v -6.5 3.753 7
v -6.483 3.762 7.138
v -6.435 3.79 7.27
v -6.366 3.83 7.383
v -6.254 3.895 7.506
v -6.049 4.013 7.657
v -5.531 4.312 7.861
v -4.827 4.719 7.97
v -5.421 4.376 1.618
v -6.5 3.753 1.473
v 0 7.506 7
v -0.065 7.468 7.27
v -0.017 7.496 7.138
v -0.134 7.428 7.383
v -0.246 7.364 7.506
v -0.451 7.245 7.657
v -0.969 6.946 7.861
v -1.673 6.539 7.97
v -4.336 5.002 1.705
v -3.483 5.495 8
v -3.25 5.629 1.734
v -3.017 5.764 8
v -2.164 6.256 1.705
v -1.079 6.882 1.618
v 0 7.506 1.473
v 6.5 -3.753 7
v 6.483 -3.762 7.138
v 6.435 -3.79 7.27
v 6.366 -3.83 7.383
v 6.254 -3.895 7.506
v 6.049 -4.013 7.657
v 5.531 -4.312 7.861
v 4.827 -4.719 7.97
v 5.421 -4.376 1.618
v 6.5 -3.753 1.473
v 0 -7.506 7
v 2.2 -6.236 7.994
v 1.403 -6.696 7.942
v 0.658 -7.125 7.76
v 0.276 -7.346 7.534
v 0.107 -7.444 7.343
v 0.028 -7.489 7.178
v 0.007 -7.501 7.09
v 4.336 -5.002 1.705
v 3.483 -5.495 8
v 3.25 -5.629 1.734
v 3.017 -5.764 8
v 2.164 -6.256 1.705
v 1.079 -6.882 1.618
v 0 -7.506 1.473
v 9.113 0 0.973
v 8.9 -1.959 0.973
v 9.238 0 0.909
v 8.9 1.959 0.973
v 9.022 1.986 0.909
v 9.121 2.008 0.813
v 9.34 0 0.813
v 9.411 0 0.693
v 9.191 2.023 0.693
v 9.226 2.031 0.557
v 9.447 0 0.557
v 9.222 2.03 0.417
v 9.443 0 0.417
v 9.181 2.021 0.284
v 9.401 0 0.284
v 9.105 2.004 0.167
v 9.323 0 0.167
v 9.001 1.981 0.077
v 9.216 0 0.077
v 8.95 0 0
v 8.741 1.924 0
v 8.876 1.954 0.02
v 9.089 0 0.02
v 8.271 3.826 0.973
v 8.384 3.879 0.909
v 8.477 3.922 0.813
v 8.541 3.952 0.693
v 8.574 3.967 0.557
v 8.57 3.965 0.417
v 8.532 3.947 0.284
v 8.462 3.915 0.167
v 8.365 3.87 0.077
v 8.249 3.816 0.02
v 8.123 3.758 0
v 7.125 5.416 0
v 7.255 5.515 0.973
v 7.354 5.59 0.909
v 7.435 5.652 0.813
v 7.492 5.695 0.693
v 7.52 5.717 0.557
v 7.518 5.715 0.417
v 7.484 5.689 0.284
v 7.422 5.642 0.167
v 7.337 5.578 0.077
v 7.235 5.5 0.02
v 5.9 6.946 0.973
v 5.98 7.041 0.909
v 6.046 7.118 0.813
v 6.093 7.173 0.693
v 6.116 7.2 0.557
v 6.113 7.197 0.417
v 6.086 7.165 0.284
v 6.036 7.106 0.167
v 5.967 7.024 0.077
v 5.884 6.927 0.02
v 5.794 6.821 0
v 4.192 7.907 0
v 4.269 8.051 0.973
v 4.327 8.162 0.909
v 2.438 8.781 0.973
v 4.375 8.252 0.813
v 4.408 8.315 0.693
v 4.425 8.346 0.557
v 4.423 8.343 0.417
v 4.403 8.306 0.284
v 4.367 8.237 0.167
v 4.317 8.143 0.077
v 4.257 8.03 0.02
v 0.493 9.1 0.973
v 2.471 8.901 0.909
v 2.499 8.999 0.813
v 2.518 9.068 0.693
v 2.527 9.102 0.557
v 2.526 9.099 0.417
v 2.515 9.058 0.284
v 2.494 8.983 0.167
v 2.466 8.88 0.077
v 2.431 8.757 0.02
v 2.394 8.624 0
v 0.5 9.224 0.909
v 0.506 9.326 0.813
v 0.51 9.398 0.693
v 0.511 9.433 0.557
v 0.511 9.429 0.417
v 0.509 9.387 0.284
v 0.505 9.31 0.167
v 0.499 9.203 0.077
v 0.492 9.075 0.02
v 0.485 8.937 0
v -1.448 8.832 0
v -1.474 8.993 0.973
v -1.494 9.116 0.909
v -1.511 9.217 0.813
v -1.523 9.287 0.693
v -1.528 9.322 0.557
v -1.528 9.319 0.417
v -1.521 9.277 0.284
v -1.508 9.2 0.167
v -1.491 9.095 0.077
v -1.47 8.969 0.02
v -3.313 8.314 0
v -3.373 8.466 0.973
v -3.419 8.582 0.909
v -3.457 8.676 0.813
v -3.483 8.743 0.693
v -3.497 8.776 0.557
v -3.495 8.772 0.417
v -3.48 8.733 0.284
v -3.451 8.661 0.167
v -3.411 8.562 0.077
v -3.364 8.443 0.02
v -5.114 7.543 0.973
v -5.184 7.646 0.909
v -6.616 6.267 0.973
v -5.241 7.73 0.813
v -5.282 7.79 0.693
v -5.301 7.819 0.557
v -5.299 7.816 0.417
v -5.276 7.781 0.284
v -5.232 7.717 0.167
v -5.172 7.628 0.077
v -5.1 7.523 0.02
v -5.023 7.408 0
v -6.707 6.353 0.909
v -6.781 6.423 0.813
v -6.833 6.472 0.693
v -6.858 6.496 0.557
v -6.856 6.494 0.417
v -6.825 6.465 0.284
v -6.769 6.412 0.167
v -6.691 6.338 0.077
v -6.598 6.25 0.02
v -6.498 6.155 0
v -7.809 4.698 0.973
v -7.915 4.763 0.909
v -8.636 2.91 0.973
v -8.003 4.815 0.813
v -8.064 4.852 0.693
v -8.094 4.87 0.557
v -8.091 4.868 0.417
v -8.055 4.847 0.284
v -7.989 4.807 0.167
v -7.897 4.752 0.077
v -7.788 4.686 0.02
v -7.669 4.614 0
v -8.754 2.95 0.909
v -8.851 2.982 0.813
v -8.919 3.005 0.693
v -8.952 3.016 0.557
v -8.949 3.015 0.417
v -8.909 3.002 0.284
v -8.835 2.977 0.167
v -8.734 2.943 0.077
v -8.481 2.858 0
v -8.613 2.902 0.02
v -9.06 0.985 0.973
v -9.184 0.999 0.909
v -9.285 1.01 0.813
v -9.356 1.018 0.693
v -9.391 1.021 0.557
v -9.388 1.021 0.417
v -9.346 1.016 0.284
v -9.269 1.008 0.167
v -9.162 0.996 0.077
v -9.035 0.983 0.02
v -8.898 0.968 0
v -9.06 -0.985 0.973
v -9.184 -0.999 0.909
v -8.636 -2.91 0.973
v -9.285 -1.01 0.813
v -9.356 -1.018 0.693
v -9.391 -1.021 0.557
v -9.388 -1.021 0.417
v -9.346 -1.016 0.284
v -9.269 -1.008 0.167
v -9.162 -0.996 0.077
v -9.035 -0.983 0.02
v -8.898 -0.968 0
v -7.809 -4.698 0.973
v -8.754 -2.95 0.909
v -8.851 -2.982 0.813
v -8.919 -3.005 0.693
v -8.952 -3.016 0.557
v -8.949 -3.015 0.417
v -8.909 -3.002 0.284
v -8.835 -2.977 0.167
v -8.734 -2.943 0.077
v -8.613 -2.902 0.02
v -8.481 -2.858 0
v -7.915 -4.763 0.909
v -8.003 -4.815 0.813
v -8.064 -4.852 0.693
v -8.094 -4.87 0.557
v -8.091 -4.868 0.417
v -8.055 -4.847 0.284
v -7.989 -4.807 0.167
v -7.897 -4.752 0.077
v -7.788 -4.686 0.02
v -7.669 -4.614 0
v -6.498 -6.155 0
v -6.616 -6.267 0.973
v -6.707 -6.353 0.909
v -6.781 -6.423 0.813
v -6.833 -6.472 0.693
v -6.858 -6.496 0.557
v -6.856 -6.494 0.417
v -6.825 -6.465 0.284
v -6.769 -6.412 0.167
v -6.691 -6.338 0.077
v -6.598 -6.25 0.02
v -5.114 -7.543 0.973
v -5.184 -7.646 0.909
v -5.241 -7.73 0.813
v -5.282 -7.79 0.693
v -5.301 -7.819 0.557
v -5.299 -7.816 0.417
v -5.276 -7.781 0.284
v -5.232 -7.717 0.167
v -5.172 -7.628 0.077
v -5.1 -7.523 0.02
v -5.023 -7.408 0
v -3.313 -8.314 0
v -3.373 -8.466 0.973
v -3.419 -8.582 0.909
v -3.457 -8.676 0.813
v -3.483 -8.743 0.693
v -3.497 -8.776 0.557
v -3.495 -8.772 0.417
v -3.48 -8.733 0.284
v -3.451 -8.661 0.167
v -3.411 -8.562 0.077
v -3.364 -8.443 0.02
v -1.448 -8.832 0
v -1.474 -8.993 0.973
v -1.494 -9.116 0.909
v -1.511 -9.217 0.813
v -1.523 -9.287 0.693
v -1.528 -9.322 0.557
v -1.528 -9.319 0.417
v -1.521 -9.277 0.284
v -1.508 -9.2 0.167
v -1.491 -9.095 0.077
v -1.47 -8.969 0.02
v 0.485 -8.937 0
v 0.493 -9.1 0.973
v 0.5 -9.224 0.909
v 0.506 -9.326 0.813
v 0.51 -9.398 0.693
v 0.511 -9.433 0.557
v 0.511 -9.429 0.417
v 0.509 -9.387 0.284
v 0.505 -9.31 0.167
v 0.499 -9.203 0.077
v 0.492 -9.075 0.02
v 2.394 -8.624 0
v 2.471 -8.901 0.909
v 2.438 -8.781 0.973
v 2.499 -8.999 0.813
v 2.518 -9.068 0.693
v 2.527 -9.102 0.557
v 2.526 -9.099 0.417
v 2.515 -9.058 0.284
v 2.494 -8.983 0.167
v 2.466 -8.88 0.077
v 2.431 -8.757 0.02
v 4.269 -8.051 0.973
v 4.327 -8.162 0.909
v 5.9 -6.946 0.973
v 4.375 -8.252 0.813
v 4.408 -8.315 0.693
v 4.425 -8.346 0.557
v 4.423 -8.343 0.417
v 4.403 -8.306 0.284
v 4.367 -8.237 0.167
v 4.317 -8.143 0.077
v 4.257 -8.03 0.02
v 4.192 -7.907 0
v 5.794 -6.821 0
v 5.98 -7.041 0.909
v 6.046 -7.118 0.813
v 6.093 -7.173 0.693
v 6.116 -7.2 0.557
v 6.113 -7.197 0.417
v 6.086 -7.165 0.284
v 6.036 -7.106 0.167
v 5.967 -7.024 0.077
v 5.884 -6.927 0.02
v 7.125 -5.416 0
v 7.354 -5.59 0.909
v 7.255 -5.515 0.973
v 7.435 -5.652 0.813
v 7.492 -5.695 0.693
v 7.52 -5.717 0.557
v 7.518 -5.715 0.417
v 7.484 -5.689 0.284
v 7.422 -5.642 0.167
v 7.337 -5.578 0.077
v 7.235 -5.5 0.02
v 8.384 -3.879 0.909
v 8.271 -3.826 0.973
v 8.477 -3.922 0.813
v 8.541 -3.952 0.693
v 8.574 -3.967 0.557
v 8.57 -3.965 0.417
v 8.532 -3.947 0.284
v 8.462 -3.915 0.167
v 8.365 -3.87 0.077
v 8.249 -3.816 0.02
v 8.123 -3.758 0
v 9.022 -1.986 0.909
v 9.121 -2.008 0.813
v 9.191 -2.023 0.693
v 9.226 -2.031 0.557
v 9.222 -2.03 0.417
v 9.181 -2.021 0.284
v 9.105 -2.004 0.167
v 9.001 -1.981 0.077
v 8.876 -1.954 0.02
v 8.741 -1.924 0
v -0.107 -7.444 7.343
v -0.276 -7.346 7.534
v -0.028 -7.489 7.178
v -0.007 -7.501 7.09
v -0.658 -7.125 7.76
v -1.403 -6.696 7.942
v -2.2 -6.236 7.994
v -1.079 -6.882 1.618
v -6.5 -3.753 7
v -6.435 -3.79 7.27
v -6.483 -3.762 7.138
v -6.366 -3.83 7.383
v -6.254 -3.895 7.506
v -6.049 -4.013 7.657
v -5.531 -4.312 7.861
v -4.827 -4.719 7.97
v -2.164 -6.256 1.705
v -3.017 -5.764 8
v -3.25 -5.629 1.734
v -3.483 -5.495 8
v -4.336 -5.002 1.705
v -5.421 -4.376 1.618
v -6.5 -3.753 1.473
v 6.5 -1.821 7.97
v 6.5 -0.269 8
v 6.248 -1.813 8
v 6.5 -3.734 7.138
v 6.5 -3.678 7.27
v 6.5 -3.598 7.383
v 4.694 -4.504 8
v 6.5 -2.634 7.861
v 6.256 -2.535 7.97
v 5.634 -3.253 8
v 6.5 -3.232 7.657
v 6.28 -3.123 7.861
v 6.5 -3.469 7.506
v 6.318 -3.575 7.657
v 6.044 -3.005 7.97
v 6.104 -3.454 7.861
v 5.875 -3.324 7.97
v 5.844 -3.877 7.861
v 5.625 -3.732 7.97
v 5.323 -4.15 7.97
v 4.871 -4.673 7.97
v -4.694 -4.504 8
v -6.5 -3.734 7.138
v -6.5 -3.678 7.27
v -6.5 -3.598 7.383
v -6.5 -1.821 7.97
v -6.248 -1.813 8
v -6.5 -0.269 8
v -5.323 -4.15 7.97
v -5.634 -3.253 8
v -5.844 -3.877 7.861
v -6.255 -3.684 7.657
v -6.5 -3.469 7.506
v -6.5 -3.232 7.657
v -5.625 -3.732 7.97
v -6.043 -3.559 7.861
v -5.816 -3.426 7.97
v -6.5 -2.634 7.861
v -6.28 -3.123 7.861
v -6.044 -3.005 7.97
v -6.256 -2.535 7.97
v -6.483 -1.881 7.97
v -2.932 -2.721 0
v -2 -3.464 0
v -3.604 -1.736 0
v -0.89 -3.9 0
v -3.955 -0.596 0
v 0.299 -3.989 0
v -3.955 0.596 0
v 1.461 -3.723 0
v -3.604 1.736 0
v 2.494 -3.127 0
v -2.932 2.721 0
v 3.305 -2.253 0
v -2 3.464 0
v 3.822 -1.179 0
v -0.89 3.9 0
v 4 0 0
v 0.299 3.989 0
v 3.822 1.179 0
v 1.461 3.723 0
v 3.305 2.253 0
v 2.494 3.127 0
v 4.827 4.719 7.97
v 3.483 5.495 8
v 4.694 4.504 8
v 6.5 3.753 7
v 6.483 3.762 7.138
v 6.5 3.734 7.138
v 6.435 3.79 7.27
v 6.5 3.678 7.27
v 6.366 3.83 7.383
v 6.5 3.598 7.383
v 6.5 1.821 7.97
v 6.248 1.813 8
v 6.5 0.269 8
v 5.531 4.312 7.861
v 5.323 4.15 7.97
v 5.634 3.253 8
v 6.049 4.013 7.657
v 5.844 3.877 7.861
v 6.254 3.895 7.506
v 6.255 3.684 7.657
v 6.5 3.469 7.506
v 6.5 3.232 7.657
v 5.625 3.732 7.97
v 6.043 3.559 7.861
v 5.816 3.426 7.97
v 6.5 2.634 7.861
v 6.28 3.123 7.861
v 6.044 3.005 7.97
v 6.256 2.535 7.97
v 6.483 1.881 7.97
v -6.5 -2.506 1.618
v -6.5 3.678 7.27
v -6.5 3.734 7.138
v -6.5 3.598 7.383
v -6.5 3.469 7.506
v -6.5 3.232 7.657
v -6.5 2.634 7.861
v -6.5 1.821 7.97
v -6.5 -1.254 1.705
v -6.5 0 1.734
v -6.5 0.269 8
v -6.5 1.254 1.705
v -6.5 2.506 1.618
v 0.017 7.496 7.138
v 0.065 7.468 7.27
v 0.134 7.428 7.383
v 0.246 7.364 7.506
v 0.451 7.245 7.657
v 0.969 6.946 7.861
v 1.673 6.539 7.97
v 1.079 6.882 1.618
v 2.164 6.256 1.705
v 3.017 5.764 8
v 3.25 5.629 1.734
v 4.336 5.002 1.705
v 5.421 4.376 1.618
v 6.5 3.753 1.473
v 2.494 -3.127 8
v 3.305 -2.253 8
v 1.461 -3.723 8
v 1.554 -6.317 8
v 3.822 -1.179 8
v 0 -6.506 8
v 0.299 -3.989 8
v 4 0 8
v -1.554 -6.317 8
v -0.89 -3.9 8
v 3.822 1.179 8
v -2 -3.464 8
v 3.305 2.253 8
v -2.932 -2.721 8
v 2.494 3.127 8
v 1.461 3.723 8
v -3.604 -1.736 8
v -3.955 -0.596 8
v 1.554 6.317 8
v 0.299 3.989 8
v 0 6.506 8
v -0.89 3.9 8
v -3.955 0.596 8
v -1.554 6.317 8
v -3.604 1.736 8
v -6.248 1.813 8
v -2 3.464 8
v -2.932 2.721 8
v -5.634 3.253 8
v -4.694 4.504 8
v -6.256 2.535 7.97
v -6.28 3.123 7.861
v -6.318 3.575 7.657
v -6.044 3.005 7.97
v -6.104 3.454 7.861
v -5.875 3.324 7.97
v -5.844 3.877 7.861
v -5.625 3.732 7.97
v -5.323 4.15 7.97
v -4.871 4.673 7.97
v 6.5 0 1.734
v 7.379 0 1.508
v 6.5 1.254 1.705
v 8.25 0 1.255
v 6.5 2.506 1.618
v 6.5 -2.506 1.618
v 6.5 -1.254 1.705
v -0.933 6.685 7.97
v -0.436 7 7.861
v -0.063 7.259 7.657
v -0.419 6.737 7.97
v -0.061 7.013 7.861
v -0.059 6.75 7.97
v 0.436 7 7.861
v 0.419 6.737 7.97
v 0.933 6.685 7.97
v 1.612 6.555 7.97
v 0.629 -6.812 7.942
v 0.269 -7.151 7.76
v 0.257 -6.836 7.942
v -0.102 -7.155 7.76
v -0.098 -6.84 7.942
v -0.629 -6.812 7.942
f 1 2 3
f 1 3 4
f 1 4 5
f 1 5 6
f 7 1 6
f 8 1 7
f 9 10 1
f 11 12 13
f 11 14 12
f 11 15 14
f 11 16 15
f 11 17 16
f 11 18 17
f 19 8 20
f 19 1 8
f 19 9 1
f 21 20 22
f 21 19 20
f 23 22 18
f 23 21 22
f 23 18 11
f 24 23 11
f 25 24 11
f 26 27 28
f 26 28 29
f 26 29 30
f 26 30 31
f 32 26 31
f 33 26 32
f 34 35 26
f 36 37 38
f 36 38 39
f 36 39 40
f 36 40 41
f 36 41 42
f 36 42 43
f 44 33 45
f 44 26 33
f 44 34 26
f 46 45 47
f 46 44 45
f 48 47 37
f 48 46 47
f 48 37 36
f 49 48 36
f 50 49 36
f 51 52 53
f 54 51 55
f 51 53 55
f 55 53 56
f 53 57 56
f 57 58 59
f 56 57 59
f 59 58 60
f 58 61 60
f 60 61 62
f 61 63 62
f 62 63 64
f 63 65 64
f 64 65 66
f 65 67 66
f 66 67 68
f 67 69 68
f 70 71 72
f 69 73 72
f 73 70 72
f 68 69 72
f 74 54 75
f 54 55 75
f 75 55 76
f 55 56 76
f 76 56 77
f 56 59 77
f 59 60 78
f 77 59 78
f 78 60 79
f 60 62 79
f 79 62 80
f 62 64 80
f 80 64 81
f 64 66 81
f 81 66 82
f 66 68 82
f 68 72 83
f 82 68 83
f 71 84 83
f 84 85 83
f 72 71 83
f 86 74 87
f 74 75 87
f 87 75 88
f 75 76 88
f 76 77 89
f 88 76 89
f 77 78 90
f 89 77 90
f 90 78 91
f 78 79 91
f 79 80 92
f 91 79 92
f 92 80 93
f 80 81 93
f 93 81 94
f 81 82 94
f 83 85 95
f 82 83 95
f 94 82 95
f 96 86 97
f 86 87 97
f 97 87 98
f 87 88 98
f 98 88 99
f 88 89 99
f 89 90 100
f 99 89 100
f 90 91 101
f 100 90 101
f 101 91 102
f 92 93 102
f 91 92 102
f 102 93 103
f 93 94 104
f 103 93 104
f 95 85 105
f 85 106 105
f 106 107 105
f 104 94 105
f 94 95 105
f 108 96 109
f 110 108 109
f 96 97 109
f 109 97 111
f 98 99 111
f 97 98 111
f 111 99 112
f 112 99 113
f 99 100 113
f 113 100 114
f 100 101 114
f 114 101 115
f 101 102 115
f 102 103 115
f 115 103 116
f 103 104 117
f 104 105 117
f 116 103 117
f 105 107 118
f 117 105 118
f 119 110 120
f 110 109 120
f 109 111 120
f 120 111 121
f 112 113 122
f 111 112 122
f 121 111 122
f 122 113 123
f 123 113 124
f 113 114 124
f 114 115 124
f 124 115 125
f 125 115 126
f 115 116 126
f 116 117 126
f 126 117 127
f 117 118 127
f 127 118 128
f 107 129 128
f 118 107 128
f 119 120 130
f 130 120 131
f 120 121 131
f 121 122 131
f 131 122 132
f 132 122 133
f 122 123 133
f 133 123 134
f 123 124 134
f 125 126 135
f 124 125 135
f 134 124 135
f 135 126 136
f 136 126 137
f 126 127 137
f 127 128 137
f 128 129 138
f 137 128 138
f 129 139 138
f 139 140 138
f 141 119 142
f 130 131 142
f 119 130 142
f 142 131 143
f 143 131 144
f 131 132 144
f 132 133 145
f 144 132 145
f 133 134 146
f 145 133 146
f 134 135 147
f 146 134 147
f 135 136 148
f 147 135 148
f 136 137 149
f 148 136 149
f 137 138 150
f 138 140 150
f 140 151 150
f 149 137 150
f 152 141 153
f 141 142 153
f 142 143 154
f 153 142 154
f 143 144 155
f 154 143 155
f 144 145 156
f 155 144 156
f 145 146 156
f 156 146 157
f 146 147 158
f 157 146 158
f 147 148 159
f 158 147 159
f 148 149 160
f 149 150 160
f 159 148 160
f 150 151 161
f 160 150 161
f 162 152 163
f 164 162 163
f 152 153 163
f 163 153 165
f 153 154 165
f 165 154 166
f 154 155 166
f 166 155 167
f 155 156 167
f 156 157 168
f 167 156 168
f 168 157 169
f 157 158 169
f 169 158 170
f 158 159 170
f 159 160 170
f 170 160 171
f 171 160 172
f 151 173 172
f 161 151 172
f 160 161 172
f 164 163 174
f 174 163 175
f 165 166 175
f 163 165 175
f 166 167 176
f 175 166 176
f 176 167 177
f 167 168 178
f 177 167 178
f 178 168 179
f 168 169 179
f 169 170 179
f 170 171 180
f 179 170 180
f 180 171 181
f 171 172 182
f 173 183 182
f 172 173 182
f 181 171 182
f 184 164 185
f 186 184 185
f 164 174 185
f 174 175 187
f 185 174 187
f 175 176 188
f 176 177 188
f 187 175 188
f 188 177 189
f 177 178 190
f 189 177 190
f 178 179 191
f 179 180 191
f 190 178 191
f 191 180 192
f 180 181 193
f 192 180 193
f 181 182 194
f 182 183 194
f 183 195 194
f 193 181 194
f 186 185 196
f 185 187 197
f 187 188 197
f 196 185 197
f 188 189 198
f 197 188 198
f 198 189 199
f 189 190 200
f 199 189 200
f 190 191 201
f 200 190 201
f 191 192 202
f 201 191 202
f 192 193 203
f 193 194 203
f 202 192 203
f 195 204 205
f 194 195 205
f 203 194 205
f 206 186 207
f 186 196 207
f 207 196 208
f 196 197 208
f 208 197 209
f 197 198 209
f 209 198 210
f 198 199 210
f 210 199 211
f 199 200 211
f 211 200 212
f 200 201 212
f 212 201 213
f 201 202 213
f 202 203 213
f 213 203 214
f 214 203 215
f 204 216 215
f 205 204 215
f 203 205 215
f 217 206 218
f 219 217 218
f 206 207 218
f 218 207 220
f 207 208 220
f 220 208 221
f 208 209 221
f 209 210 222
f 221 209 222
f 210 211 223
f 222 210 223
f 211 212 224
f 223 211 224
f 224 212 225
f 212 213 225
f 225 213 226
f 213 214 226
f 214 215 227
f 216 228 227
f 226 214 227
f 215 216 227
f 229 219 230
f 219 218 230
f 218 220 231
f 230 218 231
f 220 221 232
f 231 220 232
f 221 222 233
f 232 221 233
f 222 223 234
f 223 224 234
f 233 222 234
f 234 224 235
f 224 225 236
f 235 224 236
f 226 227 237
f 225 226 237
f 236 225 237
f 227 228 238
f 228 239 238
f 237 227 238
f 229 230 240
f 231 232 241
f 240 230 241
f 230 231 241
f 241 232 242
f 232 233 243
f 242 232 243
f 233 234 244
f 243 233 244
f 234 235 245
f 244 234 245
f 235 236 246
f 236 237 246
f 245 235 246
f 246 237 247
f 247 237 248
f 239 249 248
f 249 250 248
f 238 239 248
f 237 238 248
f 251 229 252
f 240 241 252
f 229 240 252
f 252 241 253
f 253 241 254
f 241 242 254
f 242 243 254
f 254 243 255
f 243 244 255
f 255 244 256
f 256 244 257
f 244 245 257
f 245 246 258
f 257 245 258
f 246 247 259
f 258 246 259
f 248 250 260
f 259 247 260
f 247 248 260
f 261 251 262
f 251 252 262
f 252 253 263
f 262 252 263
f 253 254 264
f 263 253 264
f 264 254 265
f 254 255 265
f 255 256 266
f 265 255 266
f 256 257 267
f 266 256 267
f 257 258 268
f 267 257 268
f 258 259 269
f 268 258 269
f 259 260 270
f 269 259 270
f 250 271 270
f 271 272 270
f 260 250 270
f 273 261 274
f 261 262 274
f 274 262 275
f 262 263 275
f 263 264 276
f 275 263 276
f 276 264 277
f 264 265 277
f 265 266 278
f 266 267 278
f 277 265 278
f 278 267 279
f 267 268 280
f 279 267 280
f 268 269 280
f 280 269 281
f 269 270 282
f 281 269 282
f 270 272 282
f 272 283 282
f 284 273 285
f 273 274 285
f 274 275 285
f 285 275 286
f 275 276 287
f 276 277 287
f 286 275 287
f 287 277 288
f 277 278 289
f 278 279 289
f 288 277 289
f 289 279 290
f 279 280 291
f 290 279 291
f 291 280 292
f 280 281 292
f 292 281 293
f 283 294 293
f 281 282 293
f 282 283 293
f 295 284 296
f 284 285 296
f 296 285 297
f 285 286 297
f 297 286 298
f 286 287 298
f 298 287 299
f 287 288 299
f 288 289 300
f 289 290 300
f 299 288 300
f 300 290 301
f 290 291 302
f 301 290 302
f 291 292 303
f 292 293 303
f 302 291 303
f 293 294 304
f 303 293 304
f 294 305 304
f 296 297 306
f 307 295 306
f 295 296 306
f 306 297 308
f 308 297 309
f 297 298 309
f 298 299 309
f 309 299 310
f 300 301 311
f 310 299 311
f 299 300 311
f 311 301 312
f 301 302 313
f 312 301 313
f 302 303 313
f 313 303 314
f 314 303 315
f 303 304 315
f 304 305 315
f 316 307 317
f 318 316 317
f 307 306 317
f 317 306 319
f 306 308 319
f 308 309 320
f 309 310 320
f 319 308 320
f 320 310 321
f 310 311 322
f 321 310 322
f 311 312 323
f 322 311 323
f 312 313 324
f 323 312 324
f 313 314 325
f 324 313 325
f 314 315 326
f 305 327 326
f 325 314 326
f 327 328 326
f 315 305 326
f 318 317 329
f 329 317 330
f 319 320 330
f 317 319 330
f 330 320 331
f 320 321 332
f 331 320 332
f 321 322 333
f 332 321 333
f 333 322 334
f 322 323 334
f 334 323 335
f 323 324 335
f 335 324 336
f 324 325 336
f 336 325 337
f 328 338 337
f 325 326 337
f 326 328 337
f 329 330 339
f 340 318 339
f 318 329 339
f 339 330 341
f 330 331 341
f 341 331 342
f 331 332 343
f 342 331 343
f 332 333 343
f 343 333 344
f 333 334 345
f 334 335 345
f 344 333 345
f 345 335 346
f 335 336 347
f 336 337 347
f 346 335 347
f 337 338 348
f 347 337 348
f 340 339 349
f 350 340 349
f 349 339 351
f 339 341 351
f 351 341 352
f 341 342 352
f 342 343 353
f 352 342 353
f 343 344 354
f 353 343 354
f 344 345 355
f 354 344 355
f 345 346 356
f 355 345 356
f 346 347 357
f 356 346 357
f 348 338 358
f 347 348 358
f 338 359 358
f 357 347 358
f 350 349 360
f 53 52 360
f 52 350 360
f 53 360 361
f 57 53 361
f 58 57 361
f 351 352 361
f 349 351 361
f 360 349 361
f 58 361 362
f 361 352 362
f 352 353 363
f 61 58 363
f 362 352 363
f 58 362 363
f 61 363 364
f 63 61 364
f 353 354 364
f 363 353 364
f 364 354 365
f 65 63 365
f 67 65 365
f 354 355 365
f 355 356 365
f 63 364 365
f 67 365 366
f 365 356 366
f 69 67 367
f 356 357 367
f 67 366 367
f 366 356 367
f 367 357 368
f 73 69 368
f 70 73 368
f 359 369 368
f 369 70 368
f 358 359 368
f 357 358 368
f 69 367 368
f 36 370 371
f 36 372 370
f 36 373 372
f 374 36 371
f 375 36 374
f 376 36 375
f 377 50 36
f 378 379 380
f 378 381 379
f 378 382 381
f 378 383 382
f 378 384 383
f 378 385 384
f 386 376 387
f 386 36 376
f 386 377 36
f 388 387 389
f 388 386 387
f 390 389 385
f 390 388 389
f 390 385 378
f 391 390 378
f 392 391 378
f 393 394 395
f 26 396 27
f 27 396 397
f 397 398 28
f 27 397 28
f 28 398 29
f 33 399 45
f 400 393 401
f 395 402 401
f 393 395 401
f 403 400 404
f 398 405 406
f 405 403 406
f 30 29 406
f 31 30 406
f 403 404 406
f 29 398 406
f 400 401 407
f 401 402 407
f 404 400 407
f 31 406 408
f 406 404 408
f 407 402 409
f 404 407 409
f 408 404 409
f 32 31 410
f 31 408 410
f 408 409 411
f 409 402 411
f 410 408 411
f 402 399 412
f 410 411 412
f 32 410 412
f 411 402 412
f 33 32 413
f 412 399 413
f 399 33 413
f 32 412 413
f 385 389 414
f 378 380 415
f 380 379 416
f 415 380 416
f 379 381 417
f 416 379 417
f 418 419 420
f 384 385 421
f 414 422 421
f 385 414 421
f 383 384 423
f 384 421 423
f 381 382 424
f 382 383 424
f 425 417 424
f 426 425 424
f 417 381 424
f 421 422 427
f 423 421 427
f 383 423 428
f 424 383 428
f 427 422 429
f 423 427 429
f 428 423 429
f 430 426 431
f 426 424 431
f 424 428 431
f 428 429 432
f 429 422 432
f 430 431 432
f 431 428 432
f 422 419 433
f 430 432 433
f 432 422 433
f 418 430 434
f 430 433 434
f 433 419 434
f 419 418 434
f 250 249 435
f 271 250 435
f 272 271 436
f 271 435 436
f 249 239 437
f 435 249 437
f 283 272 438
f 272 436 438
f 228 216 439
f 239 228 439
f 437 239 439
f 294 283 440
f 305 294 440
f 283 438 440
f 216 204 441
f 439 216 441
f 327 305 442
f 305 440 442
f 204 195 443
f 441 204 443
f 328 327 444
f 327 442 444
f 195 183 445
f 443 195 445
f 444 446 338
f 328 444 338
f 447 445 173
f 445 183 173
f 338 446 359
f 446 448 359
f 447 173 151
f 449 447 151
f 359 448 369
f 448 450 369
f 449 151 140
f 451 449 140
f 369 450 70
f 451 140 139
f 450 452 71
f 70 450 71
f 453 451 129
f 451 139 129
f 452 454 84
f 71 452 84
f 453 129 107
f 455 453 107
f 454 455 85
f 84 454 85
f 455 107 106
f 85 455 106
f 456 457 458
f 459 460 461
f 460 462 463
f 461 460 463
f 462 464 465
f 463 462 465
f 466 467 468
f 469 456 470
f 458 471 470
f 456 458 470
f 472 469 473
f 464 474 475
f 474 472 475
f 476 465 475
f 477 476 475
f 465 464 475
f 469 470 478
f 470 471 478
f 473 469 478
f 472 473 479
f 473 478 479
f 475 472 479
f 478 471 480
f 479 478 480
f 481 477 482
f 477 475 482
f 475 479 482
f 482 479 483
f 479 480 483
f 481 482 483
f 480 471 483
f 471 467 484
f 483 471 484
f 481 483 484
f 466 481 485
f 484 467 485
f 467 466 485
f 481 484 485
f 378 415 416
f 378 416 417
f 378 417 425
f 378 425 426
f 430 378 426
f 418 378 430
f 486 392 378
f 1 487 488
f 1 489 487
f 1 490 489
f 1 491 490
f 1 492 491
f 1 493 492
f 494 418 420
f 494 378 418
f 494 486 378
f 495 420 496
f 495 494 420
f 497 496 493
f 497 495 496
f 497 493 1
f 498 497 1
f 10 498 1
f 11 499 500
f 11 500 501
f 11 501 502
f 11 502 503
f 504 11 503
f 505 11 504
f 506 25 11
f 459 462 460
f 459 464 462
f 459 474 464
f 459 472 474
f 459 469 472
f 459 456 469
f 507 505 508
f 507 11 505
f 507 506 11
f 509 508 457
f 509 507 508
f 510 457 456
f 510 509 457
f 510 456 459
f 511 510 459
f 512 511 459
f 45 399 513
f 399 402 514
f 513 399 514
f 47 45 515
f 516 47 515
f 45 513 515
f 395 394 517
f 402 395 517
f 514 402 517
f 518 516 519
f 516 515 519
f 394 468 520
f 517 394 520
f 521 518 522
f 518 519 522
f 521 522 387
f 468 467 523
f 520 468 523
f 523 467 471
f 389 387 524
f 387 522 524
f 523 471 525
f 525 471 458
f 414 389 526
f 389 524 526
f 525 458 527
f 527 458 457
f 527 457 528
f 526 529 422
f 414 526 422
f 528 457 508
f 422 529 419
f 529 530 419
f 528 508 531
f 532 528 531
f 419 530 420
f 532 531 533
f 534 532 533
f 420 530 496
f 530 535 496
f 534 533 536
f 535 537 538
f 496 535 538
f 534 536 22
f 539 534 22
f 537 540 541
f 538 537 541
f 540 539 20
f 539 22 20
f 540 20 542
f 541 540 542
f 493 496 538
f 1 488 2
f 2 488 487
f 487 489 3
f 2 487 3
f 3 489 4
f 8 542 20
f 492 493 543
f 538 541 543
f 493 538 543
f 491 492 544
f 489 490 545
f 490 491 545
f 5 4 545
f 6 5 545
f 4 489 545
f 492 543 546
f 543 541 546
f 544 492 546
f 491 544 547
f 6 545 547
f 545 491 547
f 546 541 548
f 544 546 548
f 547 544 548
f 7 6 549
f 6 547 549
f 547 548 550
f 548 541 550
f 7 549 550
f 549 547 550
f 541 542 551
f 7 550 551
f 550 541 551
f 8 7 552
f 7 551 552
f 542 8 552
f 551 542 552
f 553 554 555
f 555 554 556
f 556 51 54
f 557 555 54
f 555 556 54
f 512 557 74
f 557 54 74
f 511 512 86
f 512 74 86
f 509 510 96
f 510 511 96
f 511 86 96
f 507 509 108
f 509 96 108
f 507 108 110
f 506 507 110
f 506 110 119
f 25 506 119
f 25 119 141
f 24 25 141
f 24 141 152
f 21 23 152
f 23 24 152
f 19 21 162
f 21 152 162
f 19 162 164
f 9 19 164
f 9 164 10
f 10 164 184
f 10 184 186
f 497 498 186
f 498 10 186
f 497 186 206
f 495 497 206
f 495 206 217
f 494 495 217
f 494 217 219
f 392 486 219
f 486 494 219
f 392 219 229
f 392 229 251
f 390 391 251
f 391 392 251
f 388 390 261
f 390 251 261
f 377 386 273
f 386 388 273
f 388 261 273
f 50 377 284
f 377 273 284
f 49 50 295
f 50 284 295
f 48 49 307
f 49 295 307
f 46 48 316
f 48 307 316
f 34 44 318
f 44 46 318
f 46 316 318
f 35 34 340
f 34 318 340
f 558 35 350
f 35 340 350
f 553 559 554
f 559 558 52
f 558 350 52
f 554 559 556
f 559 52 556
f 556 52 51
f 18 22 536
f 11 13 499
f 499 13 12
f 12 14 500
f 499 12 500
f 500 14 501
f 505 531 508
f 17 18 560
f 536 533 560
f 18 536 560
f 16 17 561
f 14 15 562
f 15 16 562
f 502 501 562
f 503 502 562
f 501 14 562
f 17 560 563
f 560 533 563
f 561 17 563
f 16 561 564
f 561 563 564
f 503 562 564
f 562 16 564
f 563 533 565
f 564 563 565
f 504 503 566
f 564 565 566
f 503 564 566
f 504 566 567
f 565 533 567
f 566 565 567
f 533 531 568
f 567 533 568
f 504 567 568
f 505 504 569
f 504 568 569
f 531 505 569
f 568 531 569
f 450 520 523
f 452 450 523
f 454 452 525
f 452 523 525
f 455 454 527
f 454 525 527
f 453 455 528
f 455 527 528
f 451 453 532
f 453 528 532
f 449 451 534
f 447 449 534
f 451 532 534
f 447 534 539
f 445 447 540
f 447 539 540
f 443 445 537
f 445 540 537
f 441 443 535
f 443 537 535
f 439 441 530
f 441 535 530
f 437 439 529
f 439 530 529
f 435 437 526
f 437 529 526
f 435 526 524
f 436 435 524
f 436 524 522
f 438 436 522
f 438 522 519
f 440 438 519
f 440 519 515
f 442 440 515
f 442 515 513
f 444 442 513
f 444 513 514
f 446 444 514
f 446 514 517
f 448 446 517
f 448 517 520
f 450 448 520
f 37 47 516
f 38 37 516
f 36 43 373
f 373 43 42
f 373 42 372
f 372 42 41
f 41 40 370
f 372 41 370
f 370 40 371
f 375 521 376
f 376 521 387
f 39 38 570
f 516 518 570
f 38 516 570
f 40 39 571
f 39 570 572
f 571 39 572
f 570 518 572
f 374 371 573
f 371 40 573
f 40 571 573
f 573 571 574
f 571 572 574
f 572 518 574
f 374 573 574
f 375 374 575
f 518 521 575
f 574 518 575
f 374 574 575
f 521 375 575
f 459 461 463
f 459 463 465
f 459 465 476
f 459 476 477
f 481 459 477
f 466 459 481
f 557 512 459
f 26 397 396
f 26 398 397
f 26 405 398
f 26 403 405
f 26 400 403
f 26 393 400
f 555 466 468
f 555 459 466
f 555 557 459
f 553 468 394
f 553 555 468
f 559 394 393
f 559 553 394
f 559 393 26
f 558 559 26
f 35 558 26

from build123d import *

# Parameters (mm, degrees)
HEAD_DEPTH         = 8
HOLE_SKETCH_R      = 4
THROUGH_HOLE_DEPTH = 9


with BuildPart() as part:
    # Head Sketch → Head (new body)
    with BuildSketch(Plane.XY):
        Polygon((0, 7.505553499), (6.5, 3.75277675), (6.5, -3.75277675), (0, -7.505553499), (-6.5, -3.75277675), (-6.5, 3.75277675), align=None)
    extrude(amount=HEAD_DEPTH)

    # Flange Sketch → Flange (revolve)
    with BuildSketch(Plane(origin=(0, 0, 0), x_dir=(-1, 0, 0), z_dir=(0, 1, 0))):
        with BuildLine():
            Line((-8.95, 0), (0, 0))
            Line((0, 0), (0, 2.5))
            ThreePointArc((0, 2.5), (-4.620060107, 2.115525306), (-9.11301873, 0.972678425))
            ThreePointArc((-9.11301873, 0.972678425), (-9.443122304, 0.417353804), (-8.95, 0))
        make_face()
    revolve(axis=Axis((0, 0, 1.843425858), (0, 0, 1)))

    # Sketch5 → Head Trim (revolve, cut)
    with BuildSketch(Plane(origin=(0, 0, 0), x_dir=(0, 0, -1), z_dir=(1, 0, 0))):
        with BuildLine():
            Line((-8, -6.505553499), (-8, -7.505553499))
            Line((-8, -7.505553499), (-7, -7.505553499))
            ThreePointArc((-7, -7.505553499), (-7.707106781, -7.212660281), (-8, -6.505553499))
        make_face()
    revolve(axis=Axis((0, 0, 15.085599173), (0, 0, -1)), mode=Mode.SUBTRACT)

    # Hole Sketch → Through Hole (cut, through all)
    with BuildSketch(Plane.XY.offset(8)):
        Circle(HOLE_SKETCH_R)
    extrude(amount=-THROUGH_HOLE_DEPTH, mode=Mode.SUBTRACT)


solid = part.part
